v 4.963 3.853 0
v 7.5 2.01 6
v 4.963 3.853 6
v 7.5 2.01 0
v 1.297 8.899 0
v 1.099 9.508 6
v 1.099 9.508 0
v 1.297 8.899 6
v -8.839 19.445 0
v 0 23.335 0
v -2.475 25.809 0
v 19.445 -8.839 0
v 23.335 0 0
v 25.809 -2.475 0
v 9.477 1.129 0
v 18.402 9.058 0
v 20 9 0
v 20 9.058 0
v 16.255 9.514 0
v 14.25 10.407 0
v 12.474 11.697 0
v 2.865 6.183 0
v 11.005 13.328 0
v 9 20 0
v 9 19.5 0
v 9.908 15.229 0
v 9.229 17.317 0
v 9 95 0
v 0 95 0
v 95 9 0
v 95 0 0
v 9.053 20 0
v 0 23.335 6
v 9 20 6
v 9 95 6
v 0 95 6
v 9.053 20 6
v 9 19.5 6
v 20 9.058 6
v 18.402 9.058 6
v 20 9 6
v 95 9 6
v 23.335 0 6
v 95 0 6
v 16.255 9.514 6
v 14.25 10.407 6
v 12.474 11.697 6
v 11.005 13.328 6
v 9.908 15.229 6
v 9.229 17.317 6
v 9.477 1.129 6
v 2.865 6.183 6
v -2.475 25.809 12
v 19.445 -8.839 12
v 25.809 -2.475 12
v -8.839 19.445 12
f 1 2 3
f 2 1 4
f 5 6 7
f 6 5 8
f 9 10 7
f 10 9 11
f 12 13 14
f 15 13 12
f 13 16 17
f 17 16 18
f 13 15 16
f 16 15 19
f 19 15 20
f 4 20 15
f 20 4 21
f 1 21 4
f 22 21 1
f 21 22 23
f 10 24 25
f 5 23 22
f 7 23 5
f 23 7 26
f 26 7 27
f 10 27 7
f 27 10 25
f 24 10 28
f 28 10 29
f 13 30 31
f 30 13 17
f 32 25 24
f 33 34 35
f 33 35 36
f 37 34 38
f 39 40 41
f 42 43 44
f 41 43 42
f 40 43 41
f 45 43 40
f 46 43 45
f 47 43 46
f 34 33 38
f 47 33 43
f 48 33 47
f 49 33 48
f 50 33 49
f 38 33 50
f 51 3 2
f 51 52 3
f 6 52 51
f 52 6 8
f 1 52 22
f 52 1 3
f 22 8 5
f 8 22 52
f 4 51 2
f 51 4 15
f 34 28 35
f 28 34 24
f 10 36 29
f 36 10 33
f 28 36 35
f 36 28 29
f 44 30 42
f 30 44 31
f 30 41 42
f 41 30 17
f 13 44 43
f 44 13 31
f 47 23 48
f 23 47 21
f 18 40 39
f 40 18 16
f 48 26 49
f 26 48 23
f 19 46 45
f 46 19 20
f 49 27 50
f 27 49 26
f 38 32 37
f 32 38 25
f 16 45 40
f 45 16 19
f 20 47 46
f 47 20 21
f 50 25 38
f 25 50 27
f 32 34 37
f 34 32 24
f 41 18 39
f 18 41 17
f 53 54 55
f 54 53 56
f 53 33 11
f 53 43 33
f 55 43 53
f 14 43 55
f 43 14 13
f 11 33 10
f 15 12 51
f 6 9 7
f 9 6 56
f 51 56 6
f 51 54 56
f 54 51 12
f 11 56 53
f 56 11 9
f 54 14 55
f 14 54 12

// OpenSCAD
thickness = 6;
radius = 15;
width = 5;
edge = 2;
union() {
    difference() {
        inside_track();
        outside_track();
    }
    rotate([0,0,45]) translate([7.5,-20,0]) cube([width+(2*edge),40,12]);
}

module inside_track() {
    union() {
        translate([radius,radius,0]) cylinder(thickness,radius,radius);
        translate([0,radius,0]) cube([width+(2*edge),80,thickness]);
        translate([radius,0,0]) cube([80,width+(2*edge),thickness]);
    }
}


module outside_track() {
    newrad = ((2*radius)-(width+(2*edge)))/2;
    // 19.5
    union() {
        translate([radius+((width+(2*edge))/2),radius+((width+(2*edge))/2),0]) cylinder(thickness,newrad,newrad);
        translate([width+(2*edge),20,0]) cube([10,80,thickness]);
        translate([20,width+(2*edge),0]) cube([80,10,thickness]);
  }
}
